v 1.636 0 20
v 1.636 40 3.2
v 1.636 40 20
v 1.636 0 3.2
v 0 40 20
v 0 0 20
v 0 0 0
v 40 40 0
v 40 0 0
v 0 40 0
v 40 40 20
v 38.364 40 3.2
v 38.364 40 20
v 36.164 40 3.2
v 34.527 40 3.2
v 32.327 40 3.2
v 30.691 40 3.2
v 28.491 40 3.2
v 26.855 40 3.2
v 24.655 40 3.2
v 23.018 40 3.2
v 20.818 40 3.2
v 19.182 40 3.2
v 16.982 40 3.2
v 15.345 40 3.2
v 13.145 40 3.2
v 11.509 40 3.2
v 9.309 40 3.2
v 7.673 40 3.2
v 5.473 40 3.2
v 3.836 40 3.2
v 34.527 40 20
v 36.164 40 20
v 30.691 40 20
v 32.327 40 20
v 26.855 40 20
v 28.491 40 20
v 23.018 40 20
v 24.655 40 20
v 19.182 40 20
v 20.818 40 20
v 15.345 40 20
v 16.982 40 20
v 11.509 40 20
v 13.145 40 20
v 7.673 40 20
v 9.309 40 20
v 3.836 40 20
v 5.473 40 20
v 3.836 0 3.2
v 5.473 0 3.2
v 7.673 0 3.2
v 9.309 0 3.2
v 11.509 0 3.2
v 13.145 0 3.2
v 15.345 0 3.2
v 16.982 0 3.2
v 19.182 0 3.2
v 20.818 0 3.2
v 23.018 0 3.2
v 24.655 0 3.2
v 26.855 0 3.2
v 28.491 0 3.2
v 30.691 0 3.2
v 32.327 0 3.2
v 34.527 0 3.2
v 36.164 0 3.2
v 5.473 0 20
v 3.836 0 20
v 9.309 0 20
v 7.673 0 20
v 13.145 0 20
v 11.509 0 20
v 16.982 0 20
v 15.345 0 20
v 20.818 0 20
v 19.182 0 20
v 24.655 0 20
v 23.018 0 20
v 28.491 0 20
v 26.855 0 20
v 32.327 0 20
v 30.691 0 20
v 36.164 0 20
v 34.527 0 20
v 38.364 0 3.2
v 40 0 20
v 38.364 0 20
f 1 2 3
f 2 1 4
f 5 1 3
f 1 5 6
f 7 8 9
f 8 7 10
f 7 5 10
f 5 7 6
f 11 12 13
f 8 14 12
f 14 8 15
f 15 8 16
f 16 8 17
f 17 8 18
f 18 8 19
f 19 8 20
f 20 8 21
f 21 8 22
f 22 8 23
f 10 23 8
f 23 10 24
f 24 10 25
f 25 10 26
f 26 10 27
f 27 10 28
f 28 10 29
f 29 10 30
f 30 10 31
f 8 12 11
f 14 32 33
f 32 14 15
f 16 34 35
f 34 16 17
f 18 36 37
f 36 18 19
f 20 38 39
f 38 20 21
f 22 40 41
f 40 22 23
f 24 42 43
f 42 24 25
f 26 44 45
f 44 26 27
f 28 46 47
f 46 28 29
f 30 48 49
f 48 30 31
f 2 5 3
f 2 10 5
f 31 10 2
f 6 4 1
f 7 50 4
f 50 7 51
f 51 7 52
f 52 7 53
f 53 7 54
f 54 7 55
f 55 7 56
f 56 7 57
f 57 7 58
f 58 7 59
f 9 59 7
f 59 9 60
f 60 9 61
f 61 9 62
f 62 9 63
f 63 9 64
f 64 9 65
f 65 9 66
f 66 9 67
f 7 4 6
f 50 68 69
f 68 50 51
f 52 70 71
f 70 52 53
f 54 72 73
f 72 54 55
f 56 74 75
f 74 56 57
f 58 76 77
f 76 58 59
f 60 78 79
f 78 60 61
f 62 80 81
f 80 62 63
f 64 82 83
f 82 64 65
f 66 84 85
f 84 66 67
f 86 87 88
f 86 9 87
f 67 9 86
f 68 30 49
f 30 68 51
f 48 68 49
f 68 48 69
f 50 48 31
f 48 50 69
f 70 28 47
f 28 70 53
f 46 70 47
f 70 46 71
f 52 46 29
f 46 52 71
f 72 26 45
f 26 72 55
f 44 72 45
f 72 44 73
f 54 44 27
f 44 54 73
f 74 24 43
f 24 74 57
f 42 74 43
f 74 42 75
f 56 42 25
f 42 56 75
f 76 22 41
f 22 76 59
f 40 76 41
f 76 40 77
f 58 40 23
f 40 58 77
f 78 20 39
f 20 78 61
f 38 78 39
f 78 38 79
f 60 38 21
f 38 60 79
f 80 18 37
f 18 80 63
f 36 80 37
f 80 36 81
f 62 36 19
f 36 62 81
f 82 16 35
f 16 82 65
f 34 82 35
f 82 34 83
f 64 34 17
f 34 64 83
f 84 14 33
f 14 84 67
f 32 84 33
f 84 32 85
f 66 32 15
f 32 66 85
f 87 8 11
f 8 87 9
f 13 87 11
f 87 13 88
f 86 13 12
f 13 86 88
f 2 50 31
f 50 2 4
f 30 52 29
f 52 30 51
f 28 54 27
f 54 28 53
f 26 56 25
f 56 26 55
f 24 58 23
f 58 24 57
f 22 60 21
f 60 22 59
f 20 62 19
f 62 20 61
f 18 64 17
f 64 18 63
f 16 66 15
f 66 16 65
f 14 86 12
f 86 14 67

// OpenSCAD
// Parametric straight-fin heat sink: a base plate with evenly spaced rectangular fins standing on
// it. The fins run along y; x is across them. MIT licence; see LICENSE.

/* [Heat sink] */

// Along the fins, mm
length = 40;

// Across the fins, mm
width = 40;

// Overall, base plate included, mm
height = 20;

// Thickness of the base plate, mm
base_height = 3.2;

// Gap between neighbouring fins, mm
gap_width = 2.2;

// Number of fins
num_fins = 11;

/* [Hidden] */

// Width of each fin: what is left of the width once the gaps are taken out, shared evenly.
function heat_sink_fin_width(width, gap_width, num_fins) = (width - gap_width * (num_fins - 1)) / num_fins;

// A heat sink with its base plate on z = 0, from the origin: width along x, length along y.
module heat_sink(length, width, height, base_height, gap_width, num_fins) {
  fin = heat_sink_fin_width(width, gap_width, num_fins);
  assert(length > 0 && width > 0, "heat_sink: length and width have to be more than 0");
  assert(base_height > 0 && height > base_height, "heat_sink: height has to be more than base_height, and base_height more than 0");
  assert(num_fins >= 1 && num_fins == floor(num_fins), str("heat_sink: num_fins has to be a whole number, 1 or more, not ", num_fins));
  assert(gap_width >= 0, "heat_sink: gap_width can't be negative");
  assert(fin > 0, str("heat_sink: ", num_fins, " fins with ", gap_width, " mm gaps leave no room for the fins in ", width, " mm"));
  echo(fin_width=fin);

  cube([width, length, base_height]);
  for (i = [0:num_fins - 1])
    translate([i * (fin + gap_width), 0, 0])
      cube([fin, length, height]);
}

heat_sink(length, width, height, base_height, gap_width, num_fins);
